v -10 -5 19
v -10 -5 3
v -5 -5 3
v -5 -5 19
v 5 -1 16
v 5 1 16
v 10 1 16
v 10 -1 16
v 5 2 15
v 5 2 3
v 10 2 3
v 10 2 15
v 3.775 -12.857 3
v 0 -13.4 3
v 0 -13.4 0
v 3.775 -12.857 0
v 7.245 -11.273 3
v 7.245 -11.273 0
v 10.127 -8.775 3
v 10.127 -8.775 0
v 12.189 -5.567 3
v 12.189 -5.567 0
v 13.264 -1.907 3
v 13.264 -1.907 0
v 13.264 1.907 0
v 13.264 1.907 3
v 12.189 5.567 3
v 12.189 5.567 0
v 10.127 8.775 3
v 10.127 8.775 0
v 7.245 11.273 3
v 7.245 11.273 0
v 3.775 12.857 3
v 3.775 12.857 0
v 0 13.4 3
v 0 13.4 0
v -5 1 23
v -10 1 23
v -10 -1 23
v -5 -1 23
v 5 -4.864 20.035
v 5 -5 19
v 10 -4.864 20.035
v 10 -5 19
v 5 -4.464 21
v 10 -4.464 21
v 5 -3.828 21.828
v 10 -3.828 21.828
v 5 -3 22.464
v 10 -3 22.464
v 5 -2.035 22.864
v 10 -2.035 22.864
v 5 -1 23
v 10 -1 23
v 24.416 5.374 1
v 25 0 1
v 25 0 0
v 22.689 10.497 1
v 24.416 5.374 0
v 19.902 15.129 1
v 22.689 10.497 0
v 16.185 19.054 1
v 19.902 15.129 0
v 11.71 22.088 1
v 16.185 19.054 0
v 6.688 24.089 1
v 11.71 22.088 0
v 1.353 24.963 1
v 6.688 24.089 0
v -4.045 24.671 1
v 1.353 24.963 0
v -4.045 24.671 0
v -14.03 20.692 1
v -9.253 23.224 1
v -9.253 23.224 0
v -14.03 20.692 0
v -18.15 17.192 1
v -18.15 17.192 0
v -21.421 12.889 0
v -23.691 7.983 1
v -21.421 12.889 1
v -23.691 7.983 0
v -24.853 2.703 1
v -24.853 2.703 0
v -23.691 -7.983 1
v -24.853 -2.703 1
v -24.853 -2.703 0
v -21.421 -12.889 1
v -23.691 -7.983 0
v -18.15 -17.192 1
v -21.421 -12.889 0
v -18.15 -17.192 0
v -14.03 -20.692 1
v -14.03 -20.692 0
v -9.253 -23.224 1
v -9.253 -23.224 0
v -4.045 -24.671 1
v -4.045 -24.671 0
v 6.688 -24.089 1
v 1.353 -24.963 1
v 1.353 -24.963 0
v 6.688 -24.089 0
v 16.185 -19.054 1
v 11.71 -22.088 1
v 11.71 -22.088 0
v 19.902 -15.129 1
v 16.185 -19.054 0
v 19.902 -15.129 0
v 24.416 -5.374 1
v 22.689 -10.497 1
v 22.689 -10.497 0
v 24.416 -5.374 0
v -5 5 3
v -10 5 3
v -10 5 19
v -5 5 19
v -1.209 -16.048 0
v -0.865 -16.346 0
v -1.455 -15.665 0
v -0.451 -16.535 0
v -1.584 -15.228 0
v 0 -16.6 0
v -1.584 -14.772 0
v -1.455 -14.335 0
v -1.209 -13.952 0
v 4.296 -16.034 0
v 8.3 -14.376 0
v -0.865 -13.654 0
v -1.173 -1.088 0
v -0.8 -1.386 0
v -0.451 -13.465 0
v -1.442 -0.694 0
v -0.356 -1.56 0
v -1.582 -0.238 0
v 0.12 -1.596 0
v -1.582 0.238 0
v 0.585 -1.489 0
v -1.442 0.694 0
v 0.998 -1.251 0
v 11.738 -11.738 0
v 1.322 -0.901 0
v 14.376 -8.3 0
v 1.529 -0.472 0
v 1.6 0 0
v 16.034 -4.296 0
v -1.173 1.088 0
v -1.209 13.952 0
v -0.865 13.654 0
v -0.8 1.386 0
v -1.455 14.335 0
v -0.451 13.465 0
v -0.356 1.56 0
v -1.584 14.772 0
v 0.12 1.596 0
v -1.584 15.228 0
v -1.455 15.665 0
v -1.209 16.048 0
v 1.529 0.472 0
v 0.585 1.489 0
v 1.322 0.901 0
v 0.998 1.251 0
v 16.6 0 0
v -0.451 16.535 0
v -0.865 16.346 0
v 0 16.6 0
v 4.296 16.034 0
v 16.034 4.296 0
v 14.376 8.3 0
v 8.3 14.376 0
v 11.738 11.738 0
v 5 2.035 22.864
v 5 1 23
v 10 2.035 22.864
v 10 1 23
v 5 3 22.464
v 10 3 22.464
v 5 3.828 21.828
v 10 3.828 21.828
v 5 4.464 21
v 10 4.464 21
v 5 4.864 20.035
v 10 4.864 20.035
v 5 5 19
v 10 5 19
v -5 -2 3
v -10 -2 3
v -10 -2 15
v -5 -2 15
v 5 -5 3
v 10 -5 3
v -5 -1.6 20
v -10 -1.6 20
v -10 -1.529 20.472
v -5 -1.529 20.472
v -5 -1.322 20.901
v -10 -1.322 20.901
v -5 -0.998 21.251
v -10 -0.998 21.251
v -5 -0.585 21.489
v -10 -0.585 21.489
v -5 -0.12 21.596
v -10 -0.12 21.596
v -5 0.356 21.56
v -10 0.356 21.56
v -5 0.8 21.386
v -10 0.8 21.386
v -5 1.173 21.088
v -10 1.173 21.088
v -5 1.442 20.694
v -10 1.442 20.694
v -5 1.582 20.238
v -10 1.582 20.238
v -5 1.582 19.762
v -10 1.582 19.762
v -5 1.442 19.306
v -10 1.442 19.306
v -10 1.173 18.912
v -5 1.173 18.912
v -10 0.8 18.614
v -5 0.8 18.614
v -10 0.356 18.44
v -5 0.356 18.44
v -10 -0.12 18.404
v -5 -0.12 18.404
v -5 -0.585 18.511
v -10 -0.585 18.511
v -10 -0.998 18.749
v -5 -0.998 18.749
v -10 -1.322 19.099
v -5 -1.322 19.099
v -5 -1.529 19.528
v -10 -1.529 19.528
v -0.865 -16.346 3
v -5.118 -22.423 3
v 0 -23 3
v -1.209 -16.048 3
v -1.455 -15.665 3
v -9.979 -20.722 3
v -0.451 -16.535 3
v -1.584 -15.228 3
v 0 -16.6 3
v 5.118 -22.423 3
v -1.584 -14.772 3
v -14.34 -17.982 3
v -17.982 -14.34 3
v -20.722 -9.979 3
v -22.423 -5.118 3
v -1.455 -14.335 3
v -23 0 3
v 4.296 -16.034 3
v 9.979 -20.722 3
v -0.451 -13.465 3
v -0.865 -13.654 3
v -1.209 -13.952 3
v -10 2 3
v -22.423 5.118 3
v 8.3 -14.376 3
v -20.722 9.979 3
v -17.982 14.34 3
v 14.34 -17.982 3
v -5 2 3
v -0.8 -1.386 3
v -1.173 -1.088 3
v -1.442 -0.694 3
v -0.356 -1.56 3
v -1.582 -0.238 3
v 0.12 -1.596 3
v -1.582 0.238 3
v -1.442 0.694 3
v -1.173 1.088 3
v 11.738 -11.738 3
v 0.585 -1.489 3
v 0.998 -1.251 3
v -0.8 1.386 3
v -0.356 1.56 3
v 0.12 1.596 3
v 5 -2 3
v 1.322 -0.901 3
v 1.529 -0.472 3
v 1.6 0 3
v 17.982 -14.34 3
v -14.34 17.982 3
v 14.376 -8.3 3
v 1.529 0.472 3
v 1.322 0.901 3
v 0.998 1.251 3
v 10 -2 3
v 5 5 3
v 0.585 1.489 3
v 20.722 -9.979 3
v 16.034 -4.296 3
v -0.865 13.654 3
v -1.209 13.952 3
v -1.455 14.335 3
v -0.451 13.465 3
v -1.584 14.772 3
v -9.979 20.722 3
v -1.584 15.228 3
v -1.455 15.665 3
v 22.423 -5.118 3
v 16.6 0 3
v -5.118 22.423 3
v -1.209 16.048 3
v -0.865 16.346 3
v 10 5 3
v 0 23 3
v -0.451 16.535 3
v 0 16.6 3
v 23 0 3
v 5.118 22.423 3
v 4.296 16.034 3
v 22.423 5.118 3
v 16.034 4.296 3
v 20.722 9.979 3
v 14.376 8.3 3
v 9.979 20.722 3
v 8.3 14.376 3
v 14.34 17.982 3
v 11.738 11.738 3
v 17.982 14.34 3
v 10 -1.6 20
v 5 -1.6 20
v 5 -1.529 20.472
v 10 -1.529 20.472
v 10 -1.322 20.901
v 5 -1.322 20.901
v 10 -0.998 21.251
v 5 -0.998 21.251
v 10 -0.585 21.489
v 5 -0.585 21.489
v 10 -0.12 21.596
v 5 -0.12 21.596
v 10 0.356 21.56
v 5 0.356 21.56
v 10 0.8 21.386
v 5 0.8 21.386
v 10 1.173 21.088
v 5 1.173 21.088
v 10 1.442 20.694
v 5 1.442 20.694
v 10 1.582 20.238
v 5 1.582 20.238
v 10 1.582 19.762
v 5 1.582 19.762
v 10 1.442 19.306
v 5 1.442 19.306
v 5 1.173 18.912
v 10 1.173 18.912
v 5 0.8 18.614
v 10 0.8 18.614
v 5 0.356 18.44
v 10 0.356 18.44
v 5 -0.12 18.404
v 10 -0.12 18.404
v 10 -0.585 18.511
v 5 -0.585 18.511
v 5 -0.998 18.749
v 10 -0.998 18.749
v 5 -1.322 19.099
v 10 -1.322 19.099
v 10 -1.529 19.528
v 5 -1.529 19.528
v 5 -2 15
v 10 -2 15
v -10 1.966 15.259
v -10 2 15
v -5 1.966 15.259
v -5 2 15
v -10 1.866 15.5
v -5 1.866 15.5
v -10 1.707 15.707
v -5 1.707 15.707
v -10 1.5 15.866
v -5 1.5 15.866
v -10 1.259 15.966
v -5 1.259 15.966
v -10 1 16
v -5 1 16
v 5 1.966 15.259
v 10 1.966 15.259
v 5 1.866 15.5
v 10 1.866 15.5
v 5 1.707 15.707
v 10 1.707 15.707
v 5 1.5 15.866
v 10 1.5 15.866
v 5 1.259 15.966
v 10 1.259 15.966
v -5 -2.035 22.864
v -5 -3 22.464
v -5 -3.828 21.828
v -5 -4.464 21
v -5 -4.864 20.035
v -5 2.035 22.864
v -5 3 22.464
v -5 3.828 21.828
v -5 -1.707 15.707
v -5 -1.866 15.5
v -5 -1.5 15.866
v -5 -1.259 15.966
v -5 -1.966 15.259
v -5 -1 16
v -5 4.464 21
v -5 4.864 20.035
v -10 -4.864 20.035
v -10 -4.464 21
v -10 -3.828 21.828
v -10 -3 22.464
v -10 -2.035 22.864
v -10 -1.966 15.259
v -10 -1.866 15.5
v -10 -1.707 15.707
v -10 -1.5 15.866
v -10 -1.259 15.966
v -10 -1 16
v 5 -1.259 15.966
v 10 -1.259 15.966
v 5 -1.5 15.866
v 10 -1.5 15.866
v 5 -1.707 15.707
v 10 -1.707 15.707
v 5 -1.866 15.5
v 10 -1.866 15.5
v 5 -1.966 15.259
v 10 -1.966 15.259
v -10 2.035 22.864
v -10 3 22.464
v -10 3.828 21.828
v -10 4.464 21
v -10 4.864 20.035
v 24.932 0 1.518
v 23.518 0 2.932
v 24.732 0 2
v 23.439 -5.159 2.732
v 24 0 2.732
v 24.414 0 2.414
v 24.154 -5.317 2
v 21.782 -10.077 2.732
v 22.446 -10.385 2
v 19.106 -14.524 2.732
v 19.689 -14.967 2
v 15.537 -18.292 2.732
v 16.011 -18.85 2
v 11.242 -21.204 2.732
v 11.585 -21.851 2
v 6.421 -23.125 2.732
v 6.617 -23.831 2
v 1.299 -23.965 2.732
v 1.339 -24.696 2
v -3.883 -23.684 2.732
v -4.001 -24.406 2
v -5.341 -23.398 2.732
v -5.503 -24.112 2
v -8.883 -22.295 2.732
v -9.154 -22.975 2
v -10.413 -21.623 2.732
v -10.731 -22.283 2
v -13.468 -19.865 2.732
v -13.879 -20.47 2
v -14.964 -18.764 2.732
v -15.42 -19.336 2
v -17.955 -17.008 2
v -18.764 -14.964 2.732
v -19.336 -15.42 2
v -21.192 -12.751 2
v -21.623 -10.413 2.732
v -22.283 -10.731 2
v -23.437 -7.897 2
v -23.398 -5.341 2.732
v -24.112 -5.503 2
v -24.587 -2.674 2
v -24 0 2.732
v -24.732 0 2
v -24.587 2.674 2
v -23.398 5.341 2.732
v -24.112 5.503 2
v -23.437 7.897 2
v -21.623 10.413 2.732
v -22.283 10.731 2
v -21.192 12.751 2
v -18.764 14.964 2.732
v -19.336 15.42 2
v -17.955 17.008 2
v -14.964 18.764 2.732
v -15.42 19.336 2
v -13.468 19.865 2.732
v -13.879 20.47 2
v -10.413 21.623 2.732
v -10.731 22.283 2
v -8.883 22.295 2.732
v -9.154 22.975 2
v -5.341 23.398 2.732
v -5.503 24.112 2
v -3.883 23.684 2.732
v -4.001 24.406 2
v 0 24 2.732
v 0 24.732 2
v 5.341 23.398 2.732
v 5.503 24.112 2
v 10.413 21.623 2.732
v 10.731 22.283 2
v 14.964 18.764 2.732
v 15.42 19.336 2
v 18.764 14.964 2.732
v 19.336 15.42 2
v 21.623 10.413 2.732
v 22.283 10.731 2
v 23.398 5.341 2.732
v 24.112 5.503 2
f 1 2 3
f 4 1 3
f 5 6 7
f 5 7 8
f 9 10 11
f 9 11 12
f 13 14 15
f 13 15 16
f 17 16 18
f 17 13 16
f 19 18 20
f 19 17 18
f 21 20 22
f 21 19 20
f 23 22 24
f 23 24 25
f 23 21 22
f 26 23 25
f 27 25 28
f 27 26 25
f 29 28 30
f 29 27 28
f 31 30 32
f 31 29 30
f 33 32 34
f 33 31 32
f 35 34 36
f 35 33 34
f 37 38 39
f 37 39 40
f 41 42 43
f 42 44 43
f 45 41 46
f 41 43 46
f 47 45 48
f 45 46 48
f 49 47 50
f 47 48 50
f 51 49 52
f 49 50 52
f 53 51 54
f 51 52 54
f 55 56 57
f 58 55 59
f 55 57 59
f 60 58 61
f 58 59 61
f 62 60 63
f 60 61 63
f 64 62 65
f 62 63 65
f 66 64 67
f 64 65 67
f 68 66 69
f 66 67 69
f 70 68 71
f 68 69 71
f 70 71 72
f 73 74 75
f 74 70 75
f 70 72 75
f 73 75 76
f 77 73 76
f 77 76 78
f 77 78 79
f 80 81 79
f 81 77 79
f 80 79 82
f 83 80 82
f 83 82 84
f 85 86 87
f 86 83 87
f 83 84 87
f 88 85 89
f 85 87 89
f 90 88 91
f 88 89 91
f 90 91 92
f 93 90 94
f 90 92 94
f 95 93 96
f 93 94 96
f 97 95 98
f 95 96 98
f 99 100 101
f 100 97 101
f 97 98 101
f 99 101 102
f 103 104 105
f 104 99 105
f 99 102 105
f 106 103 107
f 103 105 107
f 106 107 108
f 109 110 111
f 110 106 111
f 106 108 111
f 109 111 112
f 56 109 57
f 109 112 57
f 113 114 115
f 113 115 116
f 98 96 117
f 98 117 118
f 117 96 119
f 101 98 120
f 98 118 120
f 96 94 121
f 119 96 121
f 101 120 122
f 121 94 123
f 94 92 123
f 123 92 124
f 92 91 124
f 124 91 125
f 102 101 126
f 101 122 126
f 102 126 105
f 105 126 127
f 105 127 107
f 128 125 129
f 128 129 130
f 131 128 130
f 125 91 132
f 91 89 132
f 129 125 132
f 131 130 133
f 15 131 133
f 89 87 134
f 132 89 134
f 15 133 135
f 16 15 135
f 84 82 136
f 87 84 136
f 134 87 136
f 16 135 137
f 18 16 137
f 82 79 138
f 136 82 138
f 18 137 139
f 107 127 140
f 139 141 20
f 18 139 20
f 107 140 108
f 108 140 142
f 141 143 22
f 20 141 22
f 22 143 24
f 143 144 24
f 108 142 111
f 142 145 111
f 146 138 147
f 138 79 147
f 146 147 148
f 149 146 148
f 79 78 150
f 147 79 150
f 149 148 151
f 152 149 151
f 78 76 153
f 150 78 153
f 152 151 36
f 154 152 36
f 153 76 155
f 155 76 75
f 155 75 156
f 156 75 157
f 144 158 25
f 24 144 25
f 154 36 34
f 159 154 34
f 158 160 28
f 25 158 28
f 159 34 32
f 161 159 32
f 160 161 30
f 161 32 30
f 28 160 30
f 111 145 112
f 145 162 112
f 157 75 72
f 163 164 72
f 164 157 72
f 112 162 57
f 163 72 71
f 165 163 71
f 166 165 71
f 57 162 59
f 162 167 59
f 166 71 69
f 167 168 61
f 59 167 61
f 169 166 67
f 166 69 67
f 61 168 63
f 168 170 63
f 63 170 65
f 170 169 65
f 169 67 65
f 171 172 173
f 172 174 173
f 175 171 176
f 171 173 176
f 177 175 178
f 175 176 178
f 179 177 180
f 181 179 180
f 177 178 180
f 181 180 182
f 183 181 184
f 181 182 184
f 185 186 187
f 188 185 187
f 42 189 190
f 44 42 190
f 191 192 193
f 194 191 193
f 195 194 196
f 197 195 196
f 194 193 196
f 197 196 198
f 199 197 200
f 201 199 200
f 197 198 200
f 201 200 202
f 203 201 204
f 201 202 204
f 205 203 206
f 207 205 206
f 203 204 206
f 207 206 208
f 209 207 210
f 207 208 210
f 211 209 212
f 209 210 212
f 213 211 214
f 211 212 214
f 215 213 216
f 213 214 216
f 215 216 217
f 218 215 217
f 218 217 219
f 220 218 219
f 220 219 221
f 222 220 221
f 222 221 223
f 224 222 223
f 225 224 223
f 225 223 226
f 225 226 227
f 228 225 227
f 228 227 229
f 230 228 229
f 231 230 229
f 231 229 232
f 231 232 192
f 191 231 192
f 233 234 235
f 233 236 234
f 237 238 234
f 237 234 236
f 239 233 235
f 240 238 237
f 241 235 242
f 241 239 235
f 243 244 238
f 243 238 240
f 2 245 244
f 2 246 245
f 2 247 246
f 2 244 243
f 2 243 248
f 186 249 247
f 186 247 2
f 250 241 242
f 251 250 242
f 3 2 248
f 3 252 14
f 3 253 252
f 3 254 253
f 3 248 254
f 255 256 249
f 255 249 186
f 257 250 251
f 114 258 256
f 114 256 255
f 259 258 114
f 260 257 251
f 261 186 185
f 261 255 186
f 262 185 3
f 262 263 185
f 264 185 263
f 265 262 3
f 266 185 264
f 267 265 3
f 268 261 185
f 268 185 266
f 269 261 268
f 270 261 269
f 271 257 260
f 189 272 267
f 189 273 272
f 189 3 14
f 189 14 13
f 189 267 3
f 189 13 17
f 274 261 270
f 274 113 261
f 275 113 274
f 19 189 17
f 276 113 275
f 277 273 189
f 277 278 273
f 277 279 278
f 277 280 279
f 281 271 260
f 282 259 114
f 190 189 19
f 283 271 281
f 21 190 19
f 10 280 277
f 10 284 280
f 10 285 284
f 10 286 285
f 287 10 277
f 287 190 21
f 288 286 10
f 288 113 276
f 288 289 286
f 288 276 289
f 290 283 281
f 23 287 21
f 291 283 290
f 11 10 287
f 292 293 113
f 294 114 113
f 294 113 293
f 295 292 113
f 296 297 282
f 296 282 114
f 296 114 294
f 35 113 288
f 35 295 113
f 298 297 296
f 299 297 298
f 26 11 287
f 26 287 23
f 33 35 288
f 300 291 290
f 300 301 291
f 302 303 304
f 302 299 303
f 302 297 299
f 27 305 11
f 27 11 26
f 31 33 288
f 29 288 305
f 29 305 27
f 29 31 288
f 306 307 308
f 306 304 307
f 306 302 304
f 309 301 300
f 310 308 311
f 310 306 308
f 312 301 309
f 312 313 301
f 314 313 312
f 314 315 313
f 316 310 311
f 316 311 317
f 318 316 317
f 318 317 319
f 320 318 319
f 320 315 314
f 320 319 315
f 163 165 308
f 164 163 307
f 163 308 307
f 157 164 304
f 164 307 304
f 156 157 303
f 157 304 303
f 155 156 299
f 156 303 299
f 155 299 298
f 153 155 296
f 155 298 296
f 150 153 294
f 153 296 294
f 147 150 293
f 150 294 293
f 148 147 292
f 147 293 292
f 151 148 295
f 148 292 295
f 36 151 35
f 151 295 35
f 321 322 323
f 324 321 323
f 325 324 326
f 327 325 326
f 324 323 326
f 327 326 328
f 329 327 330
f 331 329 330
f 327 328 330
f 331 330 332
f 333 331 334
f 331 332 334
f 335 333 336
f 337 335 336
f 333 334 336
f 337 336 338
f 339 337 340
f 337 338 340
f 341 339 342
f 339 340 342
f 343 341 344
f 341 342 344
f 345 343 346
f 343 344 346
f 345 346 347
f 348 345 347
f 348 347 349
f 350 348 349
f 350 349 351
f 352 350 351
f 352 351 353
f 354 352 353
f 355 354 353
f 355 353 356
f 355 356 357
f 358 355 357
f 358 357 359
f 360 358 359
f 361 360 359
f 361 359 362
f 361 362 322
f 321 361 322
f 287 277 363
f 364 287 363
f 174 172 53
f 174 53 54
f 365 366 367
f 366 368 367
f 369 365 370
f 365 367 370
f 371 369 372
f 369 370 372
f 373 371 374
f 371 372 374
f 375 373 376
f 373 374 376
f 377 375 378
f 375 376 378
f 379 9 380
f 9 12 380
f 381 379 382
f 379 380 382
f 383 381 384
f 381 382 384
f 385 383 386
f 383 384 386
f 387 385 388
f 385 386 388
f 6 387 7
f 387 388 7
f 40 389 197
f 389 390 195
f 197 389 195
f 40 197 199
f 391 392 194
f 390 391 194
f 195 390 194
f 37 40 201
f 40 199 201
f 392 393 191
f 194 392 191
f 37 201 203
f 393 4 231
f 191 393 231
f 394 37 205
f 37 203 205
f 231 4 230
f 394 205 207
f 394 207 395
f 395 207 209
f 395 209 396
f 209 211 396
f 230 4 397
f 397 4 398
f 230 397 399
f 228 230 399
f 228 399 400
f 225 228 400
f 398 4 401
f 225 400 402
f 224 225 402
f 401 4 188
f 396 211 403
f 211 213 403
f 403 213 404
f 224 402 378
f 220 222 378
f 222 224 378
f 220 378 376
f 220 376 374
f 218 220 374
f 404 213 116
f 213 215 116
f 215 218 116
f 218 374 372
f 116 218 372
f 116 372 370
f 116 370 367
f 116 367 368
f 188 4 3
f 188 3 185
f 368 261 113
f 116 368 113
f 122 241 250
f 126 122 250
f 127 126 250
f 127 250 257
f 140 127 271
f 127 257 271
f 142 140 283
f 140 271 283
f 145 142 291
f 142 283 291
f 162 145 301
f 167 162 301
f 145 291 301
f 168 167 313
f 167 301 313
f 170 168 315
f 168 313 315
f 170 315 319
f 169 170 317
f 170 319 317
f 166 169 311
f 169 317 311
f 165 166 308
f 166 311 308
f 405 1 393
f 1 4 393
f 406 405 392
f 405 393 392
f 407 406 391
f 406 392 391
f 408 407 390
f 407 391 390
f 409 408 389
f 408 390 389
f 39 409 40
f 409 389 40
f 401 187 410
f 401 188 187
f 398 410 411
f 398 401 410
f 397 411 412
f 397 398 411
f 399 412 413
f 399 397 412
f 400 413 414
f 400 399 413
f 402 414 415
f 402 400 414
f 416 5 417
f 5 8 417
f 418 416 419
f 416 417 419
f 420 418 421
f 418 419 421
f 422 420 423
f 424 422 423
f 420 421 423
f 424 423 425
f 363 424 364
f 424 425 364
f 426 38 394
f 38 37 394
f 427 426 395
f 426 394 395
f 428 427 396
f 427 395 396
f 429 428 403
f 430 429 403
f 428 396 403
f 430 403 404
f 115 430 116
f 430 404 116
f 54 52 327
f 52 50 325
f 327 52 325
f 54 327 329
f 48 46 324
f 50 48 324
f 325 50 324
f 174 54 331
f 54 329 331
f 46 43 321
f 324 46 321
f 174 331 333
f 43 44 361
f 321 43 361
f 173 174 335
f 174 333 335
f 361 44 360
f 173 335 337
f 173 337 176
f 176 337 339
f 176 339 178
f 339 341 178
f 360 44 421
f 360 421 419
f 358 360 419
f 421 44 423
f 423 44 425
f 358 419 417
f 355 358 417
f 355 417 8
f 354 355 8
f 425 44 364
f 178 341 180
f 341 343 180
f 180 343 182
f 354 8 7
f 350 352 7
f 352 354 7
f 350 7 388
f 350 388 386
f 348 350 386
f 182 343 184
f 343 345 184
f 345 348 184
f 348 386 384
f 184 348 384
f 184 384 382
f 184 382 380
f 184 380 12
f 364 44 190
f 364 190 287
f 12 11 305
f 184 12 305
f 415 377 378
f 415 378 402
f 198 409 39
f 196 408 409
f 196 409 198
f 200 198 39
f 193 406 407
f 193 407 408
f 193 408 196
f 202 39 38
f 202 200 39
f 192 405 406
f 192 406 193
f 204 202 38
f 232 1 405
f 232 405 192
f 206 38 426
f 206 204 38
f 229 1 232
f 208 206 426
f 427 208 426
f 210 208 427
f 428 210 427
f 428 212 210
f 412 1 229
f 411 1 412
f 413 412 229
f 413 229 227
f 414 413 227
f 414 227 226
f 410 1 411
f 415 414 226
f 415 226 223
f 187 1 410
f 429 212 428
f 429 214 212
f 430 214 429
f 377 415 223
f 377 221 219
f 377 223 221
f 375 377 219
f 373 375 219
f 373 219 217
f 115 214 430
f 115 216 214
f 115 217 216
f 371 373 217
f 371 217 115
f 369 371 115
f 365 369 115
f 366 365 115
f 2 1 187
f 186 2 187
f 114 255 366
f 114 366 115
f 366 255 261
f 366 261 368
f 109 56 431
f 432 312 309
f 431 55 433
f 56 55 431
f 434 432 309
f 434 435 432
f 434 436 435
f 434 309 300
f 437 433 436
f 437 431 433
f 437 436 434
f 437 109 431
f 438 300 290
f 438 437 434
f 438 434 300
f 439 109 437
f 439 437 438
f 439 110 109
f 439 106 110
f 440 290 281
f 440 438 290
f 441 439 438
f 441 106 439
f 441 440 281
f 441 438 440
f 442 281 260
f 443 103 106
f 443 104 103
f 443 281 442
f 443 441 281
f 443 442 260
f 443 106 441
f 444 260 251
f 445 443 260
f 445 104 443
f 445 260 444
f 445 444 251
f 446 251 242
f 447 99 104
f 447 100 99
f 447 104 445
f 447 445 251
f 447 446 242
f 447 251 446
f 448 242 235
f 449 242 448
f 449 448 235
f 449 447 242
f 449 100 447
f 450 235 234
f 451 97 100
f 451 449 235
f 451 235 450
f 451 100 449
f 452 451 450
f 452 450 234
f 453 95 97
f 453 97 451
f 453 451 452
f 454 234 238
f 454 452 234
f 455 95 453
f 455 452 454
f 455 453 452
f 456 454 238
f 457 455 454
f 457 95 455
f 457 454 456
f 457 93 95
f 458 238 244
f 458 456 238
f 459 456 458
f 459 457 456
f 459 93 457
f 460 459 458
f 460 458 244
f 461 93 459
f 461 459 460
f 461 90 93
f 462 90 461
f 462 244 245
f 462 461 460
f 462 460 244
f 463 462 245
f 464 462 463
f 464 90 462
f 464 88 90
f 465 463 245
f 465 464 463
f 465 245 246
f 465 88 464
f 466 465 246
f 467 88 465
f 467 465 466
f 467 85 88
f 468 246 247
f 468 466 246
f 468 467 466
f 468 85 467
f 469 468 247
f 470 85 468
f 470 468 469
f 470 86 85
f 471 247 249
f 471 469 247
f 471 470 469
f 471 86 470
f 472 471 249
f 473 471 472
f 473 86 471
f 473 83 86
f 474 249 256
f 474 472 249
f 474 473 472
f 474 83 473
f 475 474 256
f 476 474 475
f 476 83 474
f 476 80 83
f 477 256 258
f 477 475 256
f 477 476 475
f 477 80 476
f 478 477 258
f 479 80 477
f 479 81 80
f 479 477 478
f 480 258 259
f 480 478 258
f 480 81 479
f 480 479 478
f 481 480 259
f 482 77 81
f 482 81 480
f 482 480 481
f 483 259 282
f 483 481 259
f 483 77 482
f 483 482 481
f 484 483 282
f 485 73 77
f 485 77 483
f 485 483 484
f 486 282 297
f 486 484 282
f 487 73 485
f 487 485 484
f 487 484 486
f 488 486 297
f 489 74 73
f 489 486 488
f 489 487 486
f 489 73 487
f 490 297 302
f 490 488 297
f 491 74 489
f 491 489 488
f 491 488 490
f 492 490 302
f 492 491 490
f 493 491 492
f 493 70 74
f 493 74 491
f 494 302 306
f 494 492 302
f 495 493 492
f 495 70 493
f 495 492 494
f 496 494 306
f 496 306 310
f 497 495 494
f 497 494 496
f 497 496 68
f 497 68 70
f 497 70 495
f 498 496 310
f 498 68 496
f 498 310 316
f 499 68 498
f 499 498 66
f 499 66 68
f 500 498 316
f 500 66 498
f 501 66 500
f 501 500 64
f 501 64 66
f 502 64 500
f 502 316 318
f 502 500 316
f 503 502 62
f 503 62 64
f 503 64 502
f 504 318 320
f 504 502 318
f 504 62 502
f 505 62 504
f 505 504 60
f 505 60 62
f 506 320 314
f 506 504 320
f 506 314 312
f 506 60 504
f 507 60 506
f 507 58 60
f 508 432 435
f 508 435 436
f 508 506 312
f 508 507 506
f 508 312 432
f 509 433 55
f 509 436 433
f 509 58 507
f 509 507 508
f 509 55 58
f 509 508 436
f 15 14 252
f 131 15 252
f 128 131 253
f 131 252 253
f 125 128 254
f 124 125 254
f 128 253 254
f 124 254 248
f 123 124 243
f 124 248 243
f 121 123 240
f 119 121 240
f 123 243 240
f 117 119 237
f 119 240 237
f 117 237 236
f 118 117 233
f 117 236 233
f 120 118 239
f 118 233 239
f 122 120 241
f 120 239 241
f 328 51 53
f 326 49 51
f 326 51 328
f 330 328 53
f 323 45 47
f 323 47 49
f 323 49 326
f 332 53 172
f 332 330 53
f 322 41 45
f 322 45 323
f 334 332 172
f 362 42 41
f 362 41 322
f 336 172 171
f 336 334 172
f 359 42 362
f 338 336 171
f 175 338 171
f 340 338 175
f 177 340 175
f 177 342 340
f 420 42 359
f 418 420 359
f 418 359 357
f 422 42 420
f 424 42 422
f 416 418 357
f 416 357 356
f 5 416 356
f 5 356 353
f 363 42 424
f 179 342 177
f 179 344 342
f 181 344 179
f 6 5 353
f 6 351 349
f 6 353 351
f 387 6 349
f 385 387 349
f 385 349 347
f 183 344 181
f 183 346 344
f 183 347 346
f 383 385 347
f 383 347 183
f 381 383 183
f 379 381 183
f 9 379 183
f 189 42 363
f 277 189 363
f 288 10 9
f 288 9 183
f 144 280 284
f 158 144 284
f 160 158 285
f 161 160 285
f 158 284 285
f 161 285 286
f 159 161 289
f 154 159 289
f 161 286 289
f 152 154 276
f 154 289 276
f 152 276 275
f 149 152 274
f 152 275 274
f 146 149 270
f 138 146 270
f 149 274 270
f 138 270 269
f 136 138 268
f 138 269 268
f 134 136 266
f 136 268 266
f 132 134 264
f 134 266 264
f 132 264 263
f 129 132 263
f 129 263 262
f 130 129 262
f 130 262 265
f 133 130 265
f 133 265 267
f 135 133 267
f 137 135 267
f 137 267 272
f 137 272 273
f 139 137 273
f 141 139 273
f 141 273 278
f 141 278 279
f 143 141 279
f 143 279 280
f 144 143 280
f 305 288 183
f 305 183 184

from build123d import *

# Parameters (mm, degrees)
SKETCH_R        = 25
PAD_DEPTH       = 3
SKETCH001_W     = 5
SKETCH001_H     = 10
PAD001_DEPTH    = 20
SKETCH002_R     = 1.6
POCKET_DEPTH    = 5
SKETCH003_R     = 1.6
SKETCH003_W     = 4
SKETCH003_H     = 13
POCKET001_DEPTH = 35.001
FILLET_R        = 4
FILLET001_R     = 1
FILLET002_R     = 2
POCKET002_DEPTH = 5
POCKET003_DEPTH = 5


with BuildPart() as part:
    # Sketch → Pad (new body)
    with BuildSketch(Plane.XY):
        Circle(SKETCH_R)
    extrude(amount=PAD_DEPTH)

    # Sketch001 (on Face3 of Pad) → Pad001 (join)
    with BuildSketch(Plane.XY.offset(3)):
        with Locations((-7.5, 0)):
            Rectangle(SKETCH001_W, SKETCH001_H)
        with Locations((7.5, 0)):
            Rectangle(SKETCH001_W, SKETCH001_H)
    extrude(amount=PAD001_DEPTH)

    # Sketch002 (on Face3 of Pad001) → Pocket (cut)
    with BuildSketch(Plane.XY.offset(3)):
        Circle(SKETCH002_R)
        with Locations((0, 15)):
            Circle(SKETCH002_R)
    extrude(amount=-POCKET_DEPTH, mode=Mode.SUBTRACT)

    # Sketch003 (on Face8 of Pocket) → Pocket001 (cut, through all)
    with BuildSketch(Plane(origin=(-10, 0, 0), x_dir=(0, -1, 0), z_dir=(-1, 0, 0))):
        with Locations((0, 20)):
            Circle(SKETCH003_R)
        with Locations((0, 9.5)):
            Rectangle(SKETCH003_W, SKETCH003_H)
    extrude(amount=-POCKET001_DEPTH, mode=Mode.SUBTRACT)

    # Fillet
    fillet_edges = [part.edges().sort_by_distance(p)[0] for p in [
        (-7.5, 5, 23),
        (-7.5, -5, 23),
        (7.5, -5, 23),
        (7.5, 5, 23),
    ]]
    fillet(fillet_edges, radius=FILLET_R)

    # Fillet001
    fillet001_edges = [part.edges().sort_by_distance(p)[0] for p in [
        (7.5, -2, 16),
        (-7.5, -2, 16),
        (-7.5, 2, 16),
        (7.5, 2, 16),
    ]]
    fillet(fillet001_edges, radius=FILLET001_R)

    # Fillet002
    fillet002_edges = [part.edges().sort_by_distance(p)[0] for p in [
        (-25, 0, 3),
    ]]
    fillet(fillet002_edges, radius=FILLET002_R)

    # Sketch004 (on Face1 of Fillet002) → Pocket002 (cut)
    with BuildSketch(Plane.XY.offset(3)):
        with BuildLine():
            ThreePointArc((0, -16.6), (16.6, 0), (0, 16.6))
            Line((0, 16.6), (0, 13.4))
            ThreePointArc((0, -13.4), (13.4, 0), (0, 13.4))
            Line((0, -13.4), (0, -16.6))
        make_face()
    extrude(amount=-POCKET002_DEPTH, mode=Mode.SUBTRACT)

    # Sketch005 (on Face1 of Pocket002) → Pocket003 (cut)
    with BuildSketch(Plane.XY.offset(3)):
        with BuildLine():
            ThreePointArc((0, -13.4), (-1.6, -15), (0, -16.6))
            Line((0, -13.4), (0, -16.6))
        make_face()
    extrude(amount=-POCKET003_DEPTH, mode=Mode.SUBTRACT)


solid = part.part
